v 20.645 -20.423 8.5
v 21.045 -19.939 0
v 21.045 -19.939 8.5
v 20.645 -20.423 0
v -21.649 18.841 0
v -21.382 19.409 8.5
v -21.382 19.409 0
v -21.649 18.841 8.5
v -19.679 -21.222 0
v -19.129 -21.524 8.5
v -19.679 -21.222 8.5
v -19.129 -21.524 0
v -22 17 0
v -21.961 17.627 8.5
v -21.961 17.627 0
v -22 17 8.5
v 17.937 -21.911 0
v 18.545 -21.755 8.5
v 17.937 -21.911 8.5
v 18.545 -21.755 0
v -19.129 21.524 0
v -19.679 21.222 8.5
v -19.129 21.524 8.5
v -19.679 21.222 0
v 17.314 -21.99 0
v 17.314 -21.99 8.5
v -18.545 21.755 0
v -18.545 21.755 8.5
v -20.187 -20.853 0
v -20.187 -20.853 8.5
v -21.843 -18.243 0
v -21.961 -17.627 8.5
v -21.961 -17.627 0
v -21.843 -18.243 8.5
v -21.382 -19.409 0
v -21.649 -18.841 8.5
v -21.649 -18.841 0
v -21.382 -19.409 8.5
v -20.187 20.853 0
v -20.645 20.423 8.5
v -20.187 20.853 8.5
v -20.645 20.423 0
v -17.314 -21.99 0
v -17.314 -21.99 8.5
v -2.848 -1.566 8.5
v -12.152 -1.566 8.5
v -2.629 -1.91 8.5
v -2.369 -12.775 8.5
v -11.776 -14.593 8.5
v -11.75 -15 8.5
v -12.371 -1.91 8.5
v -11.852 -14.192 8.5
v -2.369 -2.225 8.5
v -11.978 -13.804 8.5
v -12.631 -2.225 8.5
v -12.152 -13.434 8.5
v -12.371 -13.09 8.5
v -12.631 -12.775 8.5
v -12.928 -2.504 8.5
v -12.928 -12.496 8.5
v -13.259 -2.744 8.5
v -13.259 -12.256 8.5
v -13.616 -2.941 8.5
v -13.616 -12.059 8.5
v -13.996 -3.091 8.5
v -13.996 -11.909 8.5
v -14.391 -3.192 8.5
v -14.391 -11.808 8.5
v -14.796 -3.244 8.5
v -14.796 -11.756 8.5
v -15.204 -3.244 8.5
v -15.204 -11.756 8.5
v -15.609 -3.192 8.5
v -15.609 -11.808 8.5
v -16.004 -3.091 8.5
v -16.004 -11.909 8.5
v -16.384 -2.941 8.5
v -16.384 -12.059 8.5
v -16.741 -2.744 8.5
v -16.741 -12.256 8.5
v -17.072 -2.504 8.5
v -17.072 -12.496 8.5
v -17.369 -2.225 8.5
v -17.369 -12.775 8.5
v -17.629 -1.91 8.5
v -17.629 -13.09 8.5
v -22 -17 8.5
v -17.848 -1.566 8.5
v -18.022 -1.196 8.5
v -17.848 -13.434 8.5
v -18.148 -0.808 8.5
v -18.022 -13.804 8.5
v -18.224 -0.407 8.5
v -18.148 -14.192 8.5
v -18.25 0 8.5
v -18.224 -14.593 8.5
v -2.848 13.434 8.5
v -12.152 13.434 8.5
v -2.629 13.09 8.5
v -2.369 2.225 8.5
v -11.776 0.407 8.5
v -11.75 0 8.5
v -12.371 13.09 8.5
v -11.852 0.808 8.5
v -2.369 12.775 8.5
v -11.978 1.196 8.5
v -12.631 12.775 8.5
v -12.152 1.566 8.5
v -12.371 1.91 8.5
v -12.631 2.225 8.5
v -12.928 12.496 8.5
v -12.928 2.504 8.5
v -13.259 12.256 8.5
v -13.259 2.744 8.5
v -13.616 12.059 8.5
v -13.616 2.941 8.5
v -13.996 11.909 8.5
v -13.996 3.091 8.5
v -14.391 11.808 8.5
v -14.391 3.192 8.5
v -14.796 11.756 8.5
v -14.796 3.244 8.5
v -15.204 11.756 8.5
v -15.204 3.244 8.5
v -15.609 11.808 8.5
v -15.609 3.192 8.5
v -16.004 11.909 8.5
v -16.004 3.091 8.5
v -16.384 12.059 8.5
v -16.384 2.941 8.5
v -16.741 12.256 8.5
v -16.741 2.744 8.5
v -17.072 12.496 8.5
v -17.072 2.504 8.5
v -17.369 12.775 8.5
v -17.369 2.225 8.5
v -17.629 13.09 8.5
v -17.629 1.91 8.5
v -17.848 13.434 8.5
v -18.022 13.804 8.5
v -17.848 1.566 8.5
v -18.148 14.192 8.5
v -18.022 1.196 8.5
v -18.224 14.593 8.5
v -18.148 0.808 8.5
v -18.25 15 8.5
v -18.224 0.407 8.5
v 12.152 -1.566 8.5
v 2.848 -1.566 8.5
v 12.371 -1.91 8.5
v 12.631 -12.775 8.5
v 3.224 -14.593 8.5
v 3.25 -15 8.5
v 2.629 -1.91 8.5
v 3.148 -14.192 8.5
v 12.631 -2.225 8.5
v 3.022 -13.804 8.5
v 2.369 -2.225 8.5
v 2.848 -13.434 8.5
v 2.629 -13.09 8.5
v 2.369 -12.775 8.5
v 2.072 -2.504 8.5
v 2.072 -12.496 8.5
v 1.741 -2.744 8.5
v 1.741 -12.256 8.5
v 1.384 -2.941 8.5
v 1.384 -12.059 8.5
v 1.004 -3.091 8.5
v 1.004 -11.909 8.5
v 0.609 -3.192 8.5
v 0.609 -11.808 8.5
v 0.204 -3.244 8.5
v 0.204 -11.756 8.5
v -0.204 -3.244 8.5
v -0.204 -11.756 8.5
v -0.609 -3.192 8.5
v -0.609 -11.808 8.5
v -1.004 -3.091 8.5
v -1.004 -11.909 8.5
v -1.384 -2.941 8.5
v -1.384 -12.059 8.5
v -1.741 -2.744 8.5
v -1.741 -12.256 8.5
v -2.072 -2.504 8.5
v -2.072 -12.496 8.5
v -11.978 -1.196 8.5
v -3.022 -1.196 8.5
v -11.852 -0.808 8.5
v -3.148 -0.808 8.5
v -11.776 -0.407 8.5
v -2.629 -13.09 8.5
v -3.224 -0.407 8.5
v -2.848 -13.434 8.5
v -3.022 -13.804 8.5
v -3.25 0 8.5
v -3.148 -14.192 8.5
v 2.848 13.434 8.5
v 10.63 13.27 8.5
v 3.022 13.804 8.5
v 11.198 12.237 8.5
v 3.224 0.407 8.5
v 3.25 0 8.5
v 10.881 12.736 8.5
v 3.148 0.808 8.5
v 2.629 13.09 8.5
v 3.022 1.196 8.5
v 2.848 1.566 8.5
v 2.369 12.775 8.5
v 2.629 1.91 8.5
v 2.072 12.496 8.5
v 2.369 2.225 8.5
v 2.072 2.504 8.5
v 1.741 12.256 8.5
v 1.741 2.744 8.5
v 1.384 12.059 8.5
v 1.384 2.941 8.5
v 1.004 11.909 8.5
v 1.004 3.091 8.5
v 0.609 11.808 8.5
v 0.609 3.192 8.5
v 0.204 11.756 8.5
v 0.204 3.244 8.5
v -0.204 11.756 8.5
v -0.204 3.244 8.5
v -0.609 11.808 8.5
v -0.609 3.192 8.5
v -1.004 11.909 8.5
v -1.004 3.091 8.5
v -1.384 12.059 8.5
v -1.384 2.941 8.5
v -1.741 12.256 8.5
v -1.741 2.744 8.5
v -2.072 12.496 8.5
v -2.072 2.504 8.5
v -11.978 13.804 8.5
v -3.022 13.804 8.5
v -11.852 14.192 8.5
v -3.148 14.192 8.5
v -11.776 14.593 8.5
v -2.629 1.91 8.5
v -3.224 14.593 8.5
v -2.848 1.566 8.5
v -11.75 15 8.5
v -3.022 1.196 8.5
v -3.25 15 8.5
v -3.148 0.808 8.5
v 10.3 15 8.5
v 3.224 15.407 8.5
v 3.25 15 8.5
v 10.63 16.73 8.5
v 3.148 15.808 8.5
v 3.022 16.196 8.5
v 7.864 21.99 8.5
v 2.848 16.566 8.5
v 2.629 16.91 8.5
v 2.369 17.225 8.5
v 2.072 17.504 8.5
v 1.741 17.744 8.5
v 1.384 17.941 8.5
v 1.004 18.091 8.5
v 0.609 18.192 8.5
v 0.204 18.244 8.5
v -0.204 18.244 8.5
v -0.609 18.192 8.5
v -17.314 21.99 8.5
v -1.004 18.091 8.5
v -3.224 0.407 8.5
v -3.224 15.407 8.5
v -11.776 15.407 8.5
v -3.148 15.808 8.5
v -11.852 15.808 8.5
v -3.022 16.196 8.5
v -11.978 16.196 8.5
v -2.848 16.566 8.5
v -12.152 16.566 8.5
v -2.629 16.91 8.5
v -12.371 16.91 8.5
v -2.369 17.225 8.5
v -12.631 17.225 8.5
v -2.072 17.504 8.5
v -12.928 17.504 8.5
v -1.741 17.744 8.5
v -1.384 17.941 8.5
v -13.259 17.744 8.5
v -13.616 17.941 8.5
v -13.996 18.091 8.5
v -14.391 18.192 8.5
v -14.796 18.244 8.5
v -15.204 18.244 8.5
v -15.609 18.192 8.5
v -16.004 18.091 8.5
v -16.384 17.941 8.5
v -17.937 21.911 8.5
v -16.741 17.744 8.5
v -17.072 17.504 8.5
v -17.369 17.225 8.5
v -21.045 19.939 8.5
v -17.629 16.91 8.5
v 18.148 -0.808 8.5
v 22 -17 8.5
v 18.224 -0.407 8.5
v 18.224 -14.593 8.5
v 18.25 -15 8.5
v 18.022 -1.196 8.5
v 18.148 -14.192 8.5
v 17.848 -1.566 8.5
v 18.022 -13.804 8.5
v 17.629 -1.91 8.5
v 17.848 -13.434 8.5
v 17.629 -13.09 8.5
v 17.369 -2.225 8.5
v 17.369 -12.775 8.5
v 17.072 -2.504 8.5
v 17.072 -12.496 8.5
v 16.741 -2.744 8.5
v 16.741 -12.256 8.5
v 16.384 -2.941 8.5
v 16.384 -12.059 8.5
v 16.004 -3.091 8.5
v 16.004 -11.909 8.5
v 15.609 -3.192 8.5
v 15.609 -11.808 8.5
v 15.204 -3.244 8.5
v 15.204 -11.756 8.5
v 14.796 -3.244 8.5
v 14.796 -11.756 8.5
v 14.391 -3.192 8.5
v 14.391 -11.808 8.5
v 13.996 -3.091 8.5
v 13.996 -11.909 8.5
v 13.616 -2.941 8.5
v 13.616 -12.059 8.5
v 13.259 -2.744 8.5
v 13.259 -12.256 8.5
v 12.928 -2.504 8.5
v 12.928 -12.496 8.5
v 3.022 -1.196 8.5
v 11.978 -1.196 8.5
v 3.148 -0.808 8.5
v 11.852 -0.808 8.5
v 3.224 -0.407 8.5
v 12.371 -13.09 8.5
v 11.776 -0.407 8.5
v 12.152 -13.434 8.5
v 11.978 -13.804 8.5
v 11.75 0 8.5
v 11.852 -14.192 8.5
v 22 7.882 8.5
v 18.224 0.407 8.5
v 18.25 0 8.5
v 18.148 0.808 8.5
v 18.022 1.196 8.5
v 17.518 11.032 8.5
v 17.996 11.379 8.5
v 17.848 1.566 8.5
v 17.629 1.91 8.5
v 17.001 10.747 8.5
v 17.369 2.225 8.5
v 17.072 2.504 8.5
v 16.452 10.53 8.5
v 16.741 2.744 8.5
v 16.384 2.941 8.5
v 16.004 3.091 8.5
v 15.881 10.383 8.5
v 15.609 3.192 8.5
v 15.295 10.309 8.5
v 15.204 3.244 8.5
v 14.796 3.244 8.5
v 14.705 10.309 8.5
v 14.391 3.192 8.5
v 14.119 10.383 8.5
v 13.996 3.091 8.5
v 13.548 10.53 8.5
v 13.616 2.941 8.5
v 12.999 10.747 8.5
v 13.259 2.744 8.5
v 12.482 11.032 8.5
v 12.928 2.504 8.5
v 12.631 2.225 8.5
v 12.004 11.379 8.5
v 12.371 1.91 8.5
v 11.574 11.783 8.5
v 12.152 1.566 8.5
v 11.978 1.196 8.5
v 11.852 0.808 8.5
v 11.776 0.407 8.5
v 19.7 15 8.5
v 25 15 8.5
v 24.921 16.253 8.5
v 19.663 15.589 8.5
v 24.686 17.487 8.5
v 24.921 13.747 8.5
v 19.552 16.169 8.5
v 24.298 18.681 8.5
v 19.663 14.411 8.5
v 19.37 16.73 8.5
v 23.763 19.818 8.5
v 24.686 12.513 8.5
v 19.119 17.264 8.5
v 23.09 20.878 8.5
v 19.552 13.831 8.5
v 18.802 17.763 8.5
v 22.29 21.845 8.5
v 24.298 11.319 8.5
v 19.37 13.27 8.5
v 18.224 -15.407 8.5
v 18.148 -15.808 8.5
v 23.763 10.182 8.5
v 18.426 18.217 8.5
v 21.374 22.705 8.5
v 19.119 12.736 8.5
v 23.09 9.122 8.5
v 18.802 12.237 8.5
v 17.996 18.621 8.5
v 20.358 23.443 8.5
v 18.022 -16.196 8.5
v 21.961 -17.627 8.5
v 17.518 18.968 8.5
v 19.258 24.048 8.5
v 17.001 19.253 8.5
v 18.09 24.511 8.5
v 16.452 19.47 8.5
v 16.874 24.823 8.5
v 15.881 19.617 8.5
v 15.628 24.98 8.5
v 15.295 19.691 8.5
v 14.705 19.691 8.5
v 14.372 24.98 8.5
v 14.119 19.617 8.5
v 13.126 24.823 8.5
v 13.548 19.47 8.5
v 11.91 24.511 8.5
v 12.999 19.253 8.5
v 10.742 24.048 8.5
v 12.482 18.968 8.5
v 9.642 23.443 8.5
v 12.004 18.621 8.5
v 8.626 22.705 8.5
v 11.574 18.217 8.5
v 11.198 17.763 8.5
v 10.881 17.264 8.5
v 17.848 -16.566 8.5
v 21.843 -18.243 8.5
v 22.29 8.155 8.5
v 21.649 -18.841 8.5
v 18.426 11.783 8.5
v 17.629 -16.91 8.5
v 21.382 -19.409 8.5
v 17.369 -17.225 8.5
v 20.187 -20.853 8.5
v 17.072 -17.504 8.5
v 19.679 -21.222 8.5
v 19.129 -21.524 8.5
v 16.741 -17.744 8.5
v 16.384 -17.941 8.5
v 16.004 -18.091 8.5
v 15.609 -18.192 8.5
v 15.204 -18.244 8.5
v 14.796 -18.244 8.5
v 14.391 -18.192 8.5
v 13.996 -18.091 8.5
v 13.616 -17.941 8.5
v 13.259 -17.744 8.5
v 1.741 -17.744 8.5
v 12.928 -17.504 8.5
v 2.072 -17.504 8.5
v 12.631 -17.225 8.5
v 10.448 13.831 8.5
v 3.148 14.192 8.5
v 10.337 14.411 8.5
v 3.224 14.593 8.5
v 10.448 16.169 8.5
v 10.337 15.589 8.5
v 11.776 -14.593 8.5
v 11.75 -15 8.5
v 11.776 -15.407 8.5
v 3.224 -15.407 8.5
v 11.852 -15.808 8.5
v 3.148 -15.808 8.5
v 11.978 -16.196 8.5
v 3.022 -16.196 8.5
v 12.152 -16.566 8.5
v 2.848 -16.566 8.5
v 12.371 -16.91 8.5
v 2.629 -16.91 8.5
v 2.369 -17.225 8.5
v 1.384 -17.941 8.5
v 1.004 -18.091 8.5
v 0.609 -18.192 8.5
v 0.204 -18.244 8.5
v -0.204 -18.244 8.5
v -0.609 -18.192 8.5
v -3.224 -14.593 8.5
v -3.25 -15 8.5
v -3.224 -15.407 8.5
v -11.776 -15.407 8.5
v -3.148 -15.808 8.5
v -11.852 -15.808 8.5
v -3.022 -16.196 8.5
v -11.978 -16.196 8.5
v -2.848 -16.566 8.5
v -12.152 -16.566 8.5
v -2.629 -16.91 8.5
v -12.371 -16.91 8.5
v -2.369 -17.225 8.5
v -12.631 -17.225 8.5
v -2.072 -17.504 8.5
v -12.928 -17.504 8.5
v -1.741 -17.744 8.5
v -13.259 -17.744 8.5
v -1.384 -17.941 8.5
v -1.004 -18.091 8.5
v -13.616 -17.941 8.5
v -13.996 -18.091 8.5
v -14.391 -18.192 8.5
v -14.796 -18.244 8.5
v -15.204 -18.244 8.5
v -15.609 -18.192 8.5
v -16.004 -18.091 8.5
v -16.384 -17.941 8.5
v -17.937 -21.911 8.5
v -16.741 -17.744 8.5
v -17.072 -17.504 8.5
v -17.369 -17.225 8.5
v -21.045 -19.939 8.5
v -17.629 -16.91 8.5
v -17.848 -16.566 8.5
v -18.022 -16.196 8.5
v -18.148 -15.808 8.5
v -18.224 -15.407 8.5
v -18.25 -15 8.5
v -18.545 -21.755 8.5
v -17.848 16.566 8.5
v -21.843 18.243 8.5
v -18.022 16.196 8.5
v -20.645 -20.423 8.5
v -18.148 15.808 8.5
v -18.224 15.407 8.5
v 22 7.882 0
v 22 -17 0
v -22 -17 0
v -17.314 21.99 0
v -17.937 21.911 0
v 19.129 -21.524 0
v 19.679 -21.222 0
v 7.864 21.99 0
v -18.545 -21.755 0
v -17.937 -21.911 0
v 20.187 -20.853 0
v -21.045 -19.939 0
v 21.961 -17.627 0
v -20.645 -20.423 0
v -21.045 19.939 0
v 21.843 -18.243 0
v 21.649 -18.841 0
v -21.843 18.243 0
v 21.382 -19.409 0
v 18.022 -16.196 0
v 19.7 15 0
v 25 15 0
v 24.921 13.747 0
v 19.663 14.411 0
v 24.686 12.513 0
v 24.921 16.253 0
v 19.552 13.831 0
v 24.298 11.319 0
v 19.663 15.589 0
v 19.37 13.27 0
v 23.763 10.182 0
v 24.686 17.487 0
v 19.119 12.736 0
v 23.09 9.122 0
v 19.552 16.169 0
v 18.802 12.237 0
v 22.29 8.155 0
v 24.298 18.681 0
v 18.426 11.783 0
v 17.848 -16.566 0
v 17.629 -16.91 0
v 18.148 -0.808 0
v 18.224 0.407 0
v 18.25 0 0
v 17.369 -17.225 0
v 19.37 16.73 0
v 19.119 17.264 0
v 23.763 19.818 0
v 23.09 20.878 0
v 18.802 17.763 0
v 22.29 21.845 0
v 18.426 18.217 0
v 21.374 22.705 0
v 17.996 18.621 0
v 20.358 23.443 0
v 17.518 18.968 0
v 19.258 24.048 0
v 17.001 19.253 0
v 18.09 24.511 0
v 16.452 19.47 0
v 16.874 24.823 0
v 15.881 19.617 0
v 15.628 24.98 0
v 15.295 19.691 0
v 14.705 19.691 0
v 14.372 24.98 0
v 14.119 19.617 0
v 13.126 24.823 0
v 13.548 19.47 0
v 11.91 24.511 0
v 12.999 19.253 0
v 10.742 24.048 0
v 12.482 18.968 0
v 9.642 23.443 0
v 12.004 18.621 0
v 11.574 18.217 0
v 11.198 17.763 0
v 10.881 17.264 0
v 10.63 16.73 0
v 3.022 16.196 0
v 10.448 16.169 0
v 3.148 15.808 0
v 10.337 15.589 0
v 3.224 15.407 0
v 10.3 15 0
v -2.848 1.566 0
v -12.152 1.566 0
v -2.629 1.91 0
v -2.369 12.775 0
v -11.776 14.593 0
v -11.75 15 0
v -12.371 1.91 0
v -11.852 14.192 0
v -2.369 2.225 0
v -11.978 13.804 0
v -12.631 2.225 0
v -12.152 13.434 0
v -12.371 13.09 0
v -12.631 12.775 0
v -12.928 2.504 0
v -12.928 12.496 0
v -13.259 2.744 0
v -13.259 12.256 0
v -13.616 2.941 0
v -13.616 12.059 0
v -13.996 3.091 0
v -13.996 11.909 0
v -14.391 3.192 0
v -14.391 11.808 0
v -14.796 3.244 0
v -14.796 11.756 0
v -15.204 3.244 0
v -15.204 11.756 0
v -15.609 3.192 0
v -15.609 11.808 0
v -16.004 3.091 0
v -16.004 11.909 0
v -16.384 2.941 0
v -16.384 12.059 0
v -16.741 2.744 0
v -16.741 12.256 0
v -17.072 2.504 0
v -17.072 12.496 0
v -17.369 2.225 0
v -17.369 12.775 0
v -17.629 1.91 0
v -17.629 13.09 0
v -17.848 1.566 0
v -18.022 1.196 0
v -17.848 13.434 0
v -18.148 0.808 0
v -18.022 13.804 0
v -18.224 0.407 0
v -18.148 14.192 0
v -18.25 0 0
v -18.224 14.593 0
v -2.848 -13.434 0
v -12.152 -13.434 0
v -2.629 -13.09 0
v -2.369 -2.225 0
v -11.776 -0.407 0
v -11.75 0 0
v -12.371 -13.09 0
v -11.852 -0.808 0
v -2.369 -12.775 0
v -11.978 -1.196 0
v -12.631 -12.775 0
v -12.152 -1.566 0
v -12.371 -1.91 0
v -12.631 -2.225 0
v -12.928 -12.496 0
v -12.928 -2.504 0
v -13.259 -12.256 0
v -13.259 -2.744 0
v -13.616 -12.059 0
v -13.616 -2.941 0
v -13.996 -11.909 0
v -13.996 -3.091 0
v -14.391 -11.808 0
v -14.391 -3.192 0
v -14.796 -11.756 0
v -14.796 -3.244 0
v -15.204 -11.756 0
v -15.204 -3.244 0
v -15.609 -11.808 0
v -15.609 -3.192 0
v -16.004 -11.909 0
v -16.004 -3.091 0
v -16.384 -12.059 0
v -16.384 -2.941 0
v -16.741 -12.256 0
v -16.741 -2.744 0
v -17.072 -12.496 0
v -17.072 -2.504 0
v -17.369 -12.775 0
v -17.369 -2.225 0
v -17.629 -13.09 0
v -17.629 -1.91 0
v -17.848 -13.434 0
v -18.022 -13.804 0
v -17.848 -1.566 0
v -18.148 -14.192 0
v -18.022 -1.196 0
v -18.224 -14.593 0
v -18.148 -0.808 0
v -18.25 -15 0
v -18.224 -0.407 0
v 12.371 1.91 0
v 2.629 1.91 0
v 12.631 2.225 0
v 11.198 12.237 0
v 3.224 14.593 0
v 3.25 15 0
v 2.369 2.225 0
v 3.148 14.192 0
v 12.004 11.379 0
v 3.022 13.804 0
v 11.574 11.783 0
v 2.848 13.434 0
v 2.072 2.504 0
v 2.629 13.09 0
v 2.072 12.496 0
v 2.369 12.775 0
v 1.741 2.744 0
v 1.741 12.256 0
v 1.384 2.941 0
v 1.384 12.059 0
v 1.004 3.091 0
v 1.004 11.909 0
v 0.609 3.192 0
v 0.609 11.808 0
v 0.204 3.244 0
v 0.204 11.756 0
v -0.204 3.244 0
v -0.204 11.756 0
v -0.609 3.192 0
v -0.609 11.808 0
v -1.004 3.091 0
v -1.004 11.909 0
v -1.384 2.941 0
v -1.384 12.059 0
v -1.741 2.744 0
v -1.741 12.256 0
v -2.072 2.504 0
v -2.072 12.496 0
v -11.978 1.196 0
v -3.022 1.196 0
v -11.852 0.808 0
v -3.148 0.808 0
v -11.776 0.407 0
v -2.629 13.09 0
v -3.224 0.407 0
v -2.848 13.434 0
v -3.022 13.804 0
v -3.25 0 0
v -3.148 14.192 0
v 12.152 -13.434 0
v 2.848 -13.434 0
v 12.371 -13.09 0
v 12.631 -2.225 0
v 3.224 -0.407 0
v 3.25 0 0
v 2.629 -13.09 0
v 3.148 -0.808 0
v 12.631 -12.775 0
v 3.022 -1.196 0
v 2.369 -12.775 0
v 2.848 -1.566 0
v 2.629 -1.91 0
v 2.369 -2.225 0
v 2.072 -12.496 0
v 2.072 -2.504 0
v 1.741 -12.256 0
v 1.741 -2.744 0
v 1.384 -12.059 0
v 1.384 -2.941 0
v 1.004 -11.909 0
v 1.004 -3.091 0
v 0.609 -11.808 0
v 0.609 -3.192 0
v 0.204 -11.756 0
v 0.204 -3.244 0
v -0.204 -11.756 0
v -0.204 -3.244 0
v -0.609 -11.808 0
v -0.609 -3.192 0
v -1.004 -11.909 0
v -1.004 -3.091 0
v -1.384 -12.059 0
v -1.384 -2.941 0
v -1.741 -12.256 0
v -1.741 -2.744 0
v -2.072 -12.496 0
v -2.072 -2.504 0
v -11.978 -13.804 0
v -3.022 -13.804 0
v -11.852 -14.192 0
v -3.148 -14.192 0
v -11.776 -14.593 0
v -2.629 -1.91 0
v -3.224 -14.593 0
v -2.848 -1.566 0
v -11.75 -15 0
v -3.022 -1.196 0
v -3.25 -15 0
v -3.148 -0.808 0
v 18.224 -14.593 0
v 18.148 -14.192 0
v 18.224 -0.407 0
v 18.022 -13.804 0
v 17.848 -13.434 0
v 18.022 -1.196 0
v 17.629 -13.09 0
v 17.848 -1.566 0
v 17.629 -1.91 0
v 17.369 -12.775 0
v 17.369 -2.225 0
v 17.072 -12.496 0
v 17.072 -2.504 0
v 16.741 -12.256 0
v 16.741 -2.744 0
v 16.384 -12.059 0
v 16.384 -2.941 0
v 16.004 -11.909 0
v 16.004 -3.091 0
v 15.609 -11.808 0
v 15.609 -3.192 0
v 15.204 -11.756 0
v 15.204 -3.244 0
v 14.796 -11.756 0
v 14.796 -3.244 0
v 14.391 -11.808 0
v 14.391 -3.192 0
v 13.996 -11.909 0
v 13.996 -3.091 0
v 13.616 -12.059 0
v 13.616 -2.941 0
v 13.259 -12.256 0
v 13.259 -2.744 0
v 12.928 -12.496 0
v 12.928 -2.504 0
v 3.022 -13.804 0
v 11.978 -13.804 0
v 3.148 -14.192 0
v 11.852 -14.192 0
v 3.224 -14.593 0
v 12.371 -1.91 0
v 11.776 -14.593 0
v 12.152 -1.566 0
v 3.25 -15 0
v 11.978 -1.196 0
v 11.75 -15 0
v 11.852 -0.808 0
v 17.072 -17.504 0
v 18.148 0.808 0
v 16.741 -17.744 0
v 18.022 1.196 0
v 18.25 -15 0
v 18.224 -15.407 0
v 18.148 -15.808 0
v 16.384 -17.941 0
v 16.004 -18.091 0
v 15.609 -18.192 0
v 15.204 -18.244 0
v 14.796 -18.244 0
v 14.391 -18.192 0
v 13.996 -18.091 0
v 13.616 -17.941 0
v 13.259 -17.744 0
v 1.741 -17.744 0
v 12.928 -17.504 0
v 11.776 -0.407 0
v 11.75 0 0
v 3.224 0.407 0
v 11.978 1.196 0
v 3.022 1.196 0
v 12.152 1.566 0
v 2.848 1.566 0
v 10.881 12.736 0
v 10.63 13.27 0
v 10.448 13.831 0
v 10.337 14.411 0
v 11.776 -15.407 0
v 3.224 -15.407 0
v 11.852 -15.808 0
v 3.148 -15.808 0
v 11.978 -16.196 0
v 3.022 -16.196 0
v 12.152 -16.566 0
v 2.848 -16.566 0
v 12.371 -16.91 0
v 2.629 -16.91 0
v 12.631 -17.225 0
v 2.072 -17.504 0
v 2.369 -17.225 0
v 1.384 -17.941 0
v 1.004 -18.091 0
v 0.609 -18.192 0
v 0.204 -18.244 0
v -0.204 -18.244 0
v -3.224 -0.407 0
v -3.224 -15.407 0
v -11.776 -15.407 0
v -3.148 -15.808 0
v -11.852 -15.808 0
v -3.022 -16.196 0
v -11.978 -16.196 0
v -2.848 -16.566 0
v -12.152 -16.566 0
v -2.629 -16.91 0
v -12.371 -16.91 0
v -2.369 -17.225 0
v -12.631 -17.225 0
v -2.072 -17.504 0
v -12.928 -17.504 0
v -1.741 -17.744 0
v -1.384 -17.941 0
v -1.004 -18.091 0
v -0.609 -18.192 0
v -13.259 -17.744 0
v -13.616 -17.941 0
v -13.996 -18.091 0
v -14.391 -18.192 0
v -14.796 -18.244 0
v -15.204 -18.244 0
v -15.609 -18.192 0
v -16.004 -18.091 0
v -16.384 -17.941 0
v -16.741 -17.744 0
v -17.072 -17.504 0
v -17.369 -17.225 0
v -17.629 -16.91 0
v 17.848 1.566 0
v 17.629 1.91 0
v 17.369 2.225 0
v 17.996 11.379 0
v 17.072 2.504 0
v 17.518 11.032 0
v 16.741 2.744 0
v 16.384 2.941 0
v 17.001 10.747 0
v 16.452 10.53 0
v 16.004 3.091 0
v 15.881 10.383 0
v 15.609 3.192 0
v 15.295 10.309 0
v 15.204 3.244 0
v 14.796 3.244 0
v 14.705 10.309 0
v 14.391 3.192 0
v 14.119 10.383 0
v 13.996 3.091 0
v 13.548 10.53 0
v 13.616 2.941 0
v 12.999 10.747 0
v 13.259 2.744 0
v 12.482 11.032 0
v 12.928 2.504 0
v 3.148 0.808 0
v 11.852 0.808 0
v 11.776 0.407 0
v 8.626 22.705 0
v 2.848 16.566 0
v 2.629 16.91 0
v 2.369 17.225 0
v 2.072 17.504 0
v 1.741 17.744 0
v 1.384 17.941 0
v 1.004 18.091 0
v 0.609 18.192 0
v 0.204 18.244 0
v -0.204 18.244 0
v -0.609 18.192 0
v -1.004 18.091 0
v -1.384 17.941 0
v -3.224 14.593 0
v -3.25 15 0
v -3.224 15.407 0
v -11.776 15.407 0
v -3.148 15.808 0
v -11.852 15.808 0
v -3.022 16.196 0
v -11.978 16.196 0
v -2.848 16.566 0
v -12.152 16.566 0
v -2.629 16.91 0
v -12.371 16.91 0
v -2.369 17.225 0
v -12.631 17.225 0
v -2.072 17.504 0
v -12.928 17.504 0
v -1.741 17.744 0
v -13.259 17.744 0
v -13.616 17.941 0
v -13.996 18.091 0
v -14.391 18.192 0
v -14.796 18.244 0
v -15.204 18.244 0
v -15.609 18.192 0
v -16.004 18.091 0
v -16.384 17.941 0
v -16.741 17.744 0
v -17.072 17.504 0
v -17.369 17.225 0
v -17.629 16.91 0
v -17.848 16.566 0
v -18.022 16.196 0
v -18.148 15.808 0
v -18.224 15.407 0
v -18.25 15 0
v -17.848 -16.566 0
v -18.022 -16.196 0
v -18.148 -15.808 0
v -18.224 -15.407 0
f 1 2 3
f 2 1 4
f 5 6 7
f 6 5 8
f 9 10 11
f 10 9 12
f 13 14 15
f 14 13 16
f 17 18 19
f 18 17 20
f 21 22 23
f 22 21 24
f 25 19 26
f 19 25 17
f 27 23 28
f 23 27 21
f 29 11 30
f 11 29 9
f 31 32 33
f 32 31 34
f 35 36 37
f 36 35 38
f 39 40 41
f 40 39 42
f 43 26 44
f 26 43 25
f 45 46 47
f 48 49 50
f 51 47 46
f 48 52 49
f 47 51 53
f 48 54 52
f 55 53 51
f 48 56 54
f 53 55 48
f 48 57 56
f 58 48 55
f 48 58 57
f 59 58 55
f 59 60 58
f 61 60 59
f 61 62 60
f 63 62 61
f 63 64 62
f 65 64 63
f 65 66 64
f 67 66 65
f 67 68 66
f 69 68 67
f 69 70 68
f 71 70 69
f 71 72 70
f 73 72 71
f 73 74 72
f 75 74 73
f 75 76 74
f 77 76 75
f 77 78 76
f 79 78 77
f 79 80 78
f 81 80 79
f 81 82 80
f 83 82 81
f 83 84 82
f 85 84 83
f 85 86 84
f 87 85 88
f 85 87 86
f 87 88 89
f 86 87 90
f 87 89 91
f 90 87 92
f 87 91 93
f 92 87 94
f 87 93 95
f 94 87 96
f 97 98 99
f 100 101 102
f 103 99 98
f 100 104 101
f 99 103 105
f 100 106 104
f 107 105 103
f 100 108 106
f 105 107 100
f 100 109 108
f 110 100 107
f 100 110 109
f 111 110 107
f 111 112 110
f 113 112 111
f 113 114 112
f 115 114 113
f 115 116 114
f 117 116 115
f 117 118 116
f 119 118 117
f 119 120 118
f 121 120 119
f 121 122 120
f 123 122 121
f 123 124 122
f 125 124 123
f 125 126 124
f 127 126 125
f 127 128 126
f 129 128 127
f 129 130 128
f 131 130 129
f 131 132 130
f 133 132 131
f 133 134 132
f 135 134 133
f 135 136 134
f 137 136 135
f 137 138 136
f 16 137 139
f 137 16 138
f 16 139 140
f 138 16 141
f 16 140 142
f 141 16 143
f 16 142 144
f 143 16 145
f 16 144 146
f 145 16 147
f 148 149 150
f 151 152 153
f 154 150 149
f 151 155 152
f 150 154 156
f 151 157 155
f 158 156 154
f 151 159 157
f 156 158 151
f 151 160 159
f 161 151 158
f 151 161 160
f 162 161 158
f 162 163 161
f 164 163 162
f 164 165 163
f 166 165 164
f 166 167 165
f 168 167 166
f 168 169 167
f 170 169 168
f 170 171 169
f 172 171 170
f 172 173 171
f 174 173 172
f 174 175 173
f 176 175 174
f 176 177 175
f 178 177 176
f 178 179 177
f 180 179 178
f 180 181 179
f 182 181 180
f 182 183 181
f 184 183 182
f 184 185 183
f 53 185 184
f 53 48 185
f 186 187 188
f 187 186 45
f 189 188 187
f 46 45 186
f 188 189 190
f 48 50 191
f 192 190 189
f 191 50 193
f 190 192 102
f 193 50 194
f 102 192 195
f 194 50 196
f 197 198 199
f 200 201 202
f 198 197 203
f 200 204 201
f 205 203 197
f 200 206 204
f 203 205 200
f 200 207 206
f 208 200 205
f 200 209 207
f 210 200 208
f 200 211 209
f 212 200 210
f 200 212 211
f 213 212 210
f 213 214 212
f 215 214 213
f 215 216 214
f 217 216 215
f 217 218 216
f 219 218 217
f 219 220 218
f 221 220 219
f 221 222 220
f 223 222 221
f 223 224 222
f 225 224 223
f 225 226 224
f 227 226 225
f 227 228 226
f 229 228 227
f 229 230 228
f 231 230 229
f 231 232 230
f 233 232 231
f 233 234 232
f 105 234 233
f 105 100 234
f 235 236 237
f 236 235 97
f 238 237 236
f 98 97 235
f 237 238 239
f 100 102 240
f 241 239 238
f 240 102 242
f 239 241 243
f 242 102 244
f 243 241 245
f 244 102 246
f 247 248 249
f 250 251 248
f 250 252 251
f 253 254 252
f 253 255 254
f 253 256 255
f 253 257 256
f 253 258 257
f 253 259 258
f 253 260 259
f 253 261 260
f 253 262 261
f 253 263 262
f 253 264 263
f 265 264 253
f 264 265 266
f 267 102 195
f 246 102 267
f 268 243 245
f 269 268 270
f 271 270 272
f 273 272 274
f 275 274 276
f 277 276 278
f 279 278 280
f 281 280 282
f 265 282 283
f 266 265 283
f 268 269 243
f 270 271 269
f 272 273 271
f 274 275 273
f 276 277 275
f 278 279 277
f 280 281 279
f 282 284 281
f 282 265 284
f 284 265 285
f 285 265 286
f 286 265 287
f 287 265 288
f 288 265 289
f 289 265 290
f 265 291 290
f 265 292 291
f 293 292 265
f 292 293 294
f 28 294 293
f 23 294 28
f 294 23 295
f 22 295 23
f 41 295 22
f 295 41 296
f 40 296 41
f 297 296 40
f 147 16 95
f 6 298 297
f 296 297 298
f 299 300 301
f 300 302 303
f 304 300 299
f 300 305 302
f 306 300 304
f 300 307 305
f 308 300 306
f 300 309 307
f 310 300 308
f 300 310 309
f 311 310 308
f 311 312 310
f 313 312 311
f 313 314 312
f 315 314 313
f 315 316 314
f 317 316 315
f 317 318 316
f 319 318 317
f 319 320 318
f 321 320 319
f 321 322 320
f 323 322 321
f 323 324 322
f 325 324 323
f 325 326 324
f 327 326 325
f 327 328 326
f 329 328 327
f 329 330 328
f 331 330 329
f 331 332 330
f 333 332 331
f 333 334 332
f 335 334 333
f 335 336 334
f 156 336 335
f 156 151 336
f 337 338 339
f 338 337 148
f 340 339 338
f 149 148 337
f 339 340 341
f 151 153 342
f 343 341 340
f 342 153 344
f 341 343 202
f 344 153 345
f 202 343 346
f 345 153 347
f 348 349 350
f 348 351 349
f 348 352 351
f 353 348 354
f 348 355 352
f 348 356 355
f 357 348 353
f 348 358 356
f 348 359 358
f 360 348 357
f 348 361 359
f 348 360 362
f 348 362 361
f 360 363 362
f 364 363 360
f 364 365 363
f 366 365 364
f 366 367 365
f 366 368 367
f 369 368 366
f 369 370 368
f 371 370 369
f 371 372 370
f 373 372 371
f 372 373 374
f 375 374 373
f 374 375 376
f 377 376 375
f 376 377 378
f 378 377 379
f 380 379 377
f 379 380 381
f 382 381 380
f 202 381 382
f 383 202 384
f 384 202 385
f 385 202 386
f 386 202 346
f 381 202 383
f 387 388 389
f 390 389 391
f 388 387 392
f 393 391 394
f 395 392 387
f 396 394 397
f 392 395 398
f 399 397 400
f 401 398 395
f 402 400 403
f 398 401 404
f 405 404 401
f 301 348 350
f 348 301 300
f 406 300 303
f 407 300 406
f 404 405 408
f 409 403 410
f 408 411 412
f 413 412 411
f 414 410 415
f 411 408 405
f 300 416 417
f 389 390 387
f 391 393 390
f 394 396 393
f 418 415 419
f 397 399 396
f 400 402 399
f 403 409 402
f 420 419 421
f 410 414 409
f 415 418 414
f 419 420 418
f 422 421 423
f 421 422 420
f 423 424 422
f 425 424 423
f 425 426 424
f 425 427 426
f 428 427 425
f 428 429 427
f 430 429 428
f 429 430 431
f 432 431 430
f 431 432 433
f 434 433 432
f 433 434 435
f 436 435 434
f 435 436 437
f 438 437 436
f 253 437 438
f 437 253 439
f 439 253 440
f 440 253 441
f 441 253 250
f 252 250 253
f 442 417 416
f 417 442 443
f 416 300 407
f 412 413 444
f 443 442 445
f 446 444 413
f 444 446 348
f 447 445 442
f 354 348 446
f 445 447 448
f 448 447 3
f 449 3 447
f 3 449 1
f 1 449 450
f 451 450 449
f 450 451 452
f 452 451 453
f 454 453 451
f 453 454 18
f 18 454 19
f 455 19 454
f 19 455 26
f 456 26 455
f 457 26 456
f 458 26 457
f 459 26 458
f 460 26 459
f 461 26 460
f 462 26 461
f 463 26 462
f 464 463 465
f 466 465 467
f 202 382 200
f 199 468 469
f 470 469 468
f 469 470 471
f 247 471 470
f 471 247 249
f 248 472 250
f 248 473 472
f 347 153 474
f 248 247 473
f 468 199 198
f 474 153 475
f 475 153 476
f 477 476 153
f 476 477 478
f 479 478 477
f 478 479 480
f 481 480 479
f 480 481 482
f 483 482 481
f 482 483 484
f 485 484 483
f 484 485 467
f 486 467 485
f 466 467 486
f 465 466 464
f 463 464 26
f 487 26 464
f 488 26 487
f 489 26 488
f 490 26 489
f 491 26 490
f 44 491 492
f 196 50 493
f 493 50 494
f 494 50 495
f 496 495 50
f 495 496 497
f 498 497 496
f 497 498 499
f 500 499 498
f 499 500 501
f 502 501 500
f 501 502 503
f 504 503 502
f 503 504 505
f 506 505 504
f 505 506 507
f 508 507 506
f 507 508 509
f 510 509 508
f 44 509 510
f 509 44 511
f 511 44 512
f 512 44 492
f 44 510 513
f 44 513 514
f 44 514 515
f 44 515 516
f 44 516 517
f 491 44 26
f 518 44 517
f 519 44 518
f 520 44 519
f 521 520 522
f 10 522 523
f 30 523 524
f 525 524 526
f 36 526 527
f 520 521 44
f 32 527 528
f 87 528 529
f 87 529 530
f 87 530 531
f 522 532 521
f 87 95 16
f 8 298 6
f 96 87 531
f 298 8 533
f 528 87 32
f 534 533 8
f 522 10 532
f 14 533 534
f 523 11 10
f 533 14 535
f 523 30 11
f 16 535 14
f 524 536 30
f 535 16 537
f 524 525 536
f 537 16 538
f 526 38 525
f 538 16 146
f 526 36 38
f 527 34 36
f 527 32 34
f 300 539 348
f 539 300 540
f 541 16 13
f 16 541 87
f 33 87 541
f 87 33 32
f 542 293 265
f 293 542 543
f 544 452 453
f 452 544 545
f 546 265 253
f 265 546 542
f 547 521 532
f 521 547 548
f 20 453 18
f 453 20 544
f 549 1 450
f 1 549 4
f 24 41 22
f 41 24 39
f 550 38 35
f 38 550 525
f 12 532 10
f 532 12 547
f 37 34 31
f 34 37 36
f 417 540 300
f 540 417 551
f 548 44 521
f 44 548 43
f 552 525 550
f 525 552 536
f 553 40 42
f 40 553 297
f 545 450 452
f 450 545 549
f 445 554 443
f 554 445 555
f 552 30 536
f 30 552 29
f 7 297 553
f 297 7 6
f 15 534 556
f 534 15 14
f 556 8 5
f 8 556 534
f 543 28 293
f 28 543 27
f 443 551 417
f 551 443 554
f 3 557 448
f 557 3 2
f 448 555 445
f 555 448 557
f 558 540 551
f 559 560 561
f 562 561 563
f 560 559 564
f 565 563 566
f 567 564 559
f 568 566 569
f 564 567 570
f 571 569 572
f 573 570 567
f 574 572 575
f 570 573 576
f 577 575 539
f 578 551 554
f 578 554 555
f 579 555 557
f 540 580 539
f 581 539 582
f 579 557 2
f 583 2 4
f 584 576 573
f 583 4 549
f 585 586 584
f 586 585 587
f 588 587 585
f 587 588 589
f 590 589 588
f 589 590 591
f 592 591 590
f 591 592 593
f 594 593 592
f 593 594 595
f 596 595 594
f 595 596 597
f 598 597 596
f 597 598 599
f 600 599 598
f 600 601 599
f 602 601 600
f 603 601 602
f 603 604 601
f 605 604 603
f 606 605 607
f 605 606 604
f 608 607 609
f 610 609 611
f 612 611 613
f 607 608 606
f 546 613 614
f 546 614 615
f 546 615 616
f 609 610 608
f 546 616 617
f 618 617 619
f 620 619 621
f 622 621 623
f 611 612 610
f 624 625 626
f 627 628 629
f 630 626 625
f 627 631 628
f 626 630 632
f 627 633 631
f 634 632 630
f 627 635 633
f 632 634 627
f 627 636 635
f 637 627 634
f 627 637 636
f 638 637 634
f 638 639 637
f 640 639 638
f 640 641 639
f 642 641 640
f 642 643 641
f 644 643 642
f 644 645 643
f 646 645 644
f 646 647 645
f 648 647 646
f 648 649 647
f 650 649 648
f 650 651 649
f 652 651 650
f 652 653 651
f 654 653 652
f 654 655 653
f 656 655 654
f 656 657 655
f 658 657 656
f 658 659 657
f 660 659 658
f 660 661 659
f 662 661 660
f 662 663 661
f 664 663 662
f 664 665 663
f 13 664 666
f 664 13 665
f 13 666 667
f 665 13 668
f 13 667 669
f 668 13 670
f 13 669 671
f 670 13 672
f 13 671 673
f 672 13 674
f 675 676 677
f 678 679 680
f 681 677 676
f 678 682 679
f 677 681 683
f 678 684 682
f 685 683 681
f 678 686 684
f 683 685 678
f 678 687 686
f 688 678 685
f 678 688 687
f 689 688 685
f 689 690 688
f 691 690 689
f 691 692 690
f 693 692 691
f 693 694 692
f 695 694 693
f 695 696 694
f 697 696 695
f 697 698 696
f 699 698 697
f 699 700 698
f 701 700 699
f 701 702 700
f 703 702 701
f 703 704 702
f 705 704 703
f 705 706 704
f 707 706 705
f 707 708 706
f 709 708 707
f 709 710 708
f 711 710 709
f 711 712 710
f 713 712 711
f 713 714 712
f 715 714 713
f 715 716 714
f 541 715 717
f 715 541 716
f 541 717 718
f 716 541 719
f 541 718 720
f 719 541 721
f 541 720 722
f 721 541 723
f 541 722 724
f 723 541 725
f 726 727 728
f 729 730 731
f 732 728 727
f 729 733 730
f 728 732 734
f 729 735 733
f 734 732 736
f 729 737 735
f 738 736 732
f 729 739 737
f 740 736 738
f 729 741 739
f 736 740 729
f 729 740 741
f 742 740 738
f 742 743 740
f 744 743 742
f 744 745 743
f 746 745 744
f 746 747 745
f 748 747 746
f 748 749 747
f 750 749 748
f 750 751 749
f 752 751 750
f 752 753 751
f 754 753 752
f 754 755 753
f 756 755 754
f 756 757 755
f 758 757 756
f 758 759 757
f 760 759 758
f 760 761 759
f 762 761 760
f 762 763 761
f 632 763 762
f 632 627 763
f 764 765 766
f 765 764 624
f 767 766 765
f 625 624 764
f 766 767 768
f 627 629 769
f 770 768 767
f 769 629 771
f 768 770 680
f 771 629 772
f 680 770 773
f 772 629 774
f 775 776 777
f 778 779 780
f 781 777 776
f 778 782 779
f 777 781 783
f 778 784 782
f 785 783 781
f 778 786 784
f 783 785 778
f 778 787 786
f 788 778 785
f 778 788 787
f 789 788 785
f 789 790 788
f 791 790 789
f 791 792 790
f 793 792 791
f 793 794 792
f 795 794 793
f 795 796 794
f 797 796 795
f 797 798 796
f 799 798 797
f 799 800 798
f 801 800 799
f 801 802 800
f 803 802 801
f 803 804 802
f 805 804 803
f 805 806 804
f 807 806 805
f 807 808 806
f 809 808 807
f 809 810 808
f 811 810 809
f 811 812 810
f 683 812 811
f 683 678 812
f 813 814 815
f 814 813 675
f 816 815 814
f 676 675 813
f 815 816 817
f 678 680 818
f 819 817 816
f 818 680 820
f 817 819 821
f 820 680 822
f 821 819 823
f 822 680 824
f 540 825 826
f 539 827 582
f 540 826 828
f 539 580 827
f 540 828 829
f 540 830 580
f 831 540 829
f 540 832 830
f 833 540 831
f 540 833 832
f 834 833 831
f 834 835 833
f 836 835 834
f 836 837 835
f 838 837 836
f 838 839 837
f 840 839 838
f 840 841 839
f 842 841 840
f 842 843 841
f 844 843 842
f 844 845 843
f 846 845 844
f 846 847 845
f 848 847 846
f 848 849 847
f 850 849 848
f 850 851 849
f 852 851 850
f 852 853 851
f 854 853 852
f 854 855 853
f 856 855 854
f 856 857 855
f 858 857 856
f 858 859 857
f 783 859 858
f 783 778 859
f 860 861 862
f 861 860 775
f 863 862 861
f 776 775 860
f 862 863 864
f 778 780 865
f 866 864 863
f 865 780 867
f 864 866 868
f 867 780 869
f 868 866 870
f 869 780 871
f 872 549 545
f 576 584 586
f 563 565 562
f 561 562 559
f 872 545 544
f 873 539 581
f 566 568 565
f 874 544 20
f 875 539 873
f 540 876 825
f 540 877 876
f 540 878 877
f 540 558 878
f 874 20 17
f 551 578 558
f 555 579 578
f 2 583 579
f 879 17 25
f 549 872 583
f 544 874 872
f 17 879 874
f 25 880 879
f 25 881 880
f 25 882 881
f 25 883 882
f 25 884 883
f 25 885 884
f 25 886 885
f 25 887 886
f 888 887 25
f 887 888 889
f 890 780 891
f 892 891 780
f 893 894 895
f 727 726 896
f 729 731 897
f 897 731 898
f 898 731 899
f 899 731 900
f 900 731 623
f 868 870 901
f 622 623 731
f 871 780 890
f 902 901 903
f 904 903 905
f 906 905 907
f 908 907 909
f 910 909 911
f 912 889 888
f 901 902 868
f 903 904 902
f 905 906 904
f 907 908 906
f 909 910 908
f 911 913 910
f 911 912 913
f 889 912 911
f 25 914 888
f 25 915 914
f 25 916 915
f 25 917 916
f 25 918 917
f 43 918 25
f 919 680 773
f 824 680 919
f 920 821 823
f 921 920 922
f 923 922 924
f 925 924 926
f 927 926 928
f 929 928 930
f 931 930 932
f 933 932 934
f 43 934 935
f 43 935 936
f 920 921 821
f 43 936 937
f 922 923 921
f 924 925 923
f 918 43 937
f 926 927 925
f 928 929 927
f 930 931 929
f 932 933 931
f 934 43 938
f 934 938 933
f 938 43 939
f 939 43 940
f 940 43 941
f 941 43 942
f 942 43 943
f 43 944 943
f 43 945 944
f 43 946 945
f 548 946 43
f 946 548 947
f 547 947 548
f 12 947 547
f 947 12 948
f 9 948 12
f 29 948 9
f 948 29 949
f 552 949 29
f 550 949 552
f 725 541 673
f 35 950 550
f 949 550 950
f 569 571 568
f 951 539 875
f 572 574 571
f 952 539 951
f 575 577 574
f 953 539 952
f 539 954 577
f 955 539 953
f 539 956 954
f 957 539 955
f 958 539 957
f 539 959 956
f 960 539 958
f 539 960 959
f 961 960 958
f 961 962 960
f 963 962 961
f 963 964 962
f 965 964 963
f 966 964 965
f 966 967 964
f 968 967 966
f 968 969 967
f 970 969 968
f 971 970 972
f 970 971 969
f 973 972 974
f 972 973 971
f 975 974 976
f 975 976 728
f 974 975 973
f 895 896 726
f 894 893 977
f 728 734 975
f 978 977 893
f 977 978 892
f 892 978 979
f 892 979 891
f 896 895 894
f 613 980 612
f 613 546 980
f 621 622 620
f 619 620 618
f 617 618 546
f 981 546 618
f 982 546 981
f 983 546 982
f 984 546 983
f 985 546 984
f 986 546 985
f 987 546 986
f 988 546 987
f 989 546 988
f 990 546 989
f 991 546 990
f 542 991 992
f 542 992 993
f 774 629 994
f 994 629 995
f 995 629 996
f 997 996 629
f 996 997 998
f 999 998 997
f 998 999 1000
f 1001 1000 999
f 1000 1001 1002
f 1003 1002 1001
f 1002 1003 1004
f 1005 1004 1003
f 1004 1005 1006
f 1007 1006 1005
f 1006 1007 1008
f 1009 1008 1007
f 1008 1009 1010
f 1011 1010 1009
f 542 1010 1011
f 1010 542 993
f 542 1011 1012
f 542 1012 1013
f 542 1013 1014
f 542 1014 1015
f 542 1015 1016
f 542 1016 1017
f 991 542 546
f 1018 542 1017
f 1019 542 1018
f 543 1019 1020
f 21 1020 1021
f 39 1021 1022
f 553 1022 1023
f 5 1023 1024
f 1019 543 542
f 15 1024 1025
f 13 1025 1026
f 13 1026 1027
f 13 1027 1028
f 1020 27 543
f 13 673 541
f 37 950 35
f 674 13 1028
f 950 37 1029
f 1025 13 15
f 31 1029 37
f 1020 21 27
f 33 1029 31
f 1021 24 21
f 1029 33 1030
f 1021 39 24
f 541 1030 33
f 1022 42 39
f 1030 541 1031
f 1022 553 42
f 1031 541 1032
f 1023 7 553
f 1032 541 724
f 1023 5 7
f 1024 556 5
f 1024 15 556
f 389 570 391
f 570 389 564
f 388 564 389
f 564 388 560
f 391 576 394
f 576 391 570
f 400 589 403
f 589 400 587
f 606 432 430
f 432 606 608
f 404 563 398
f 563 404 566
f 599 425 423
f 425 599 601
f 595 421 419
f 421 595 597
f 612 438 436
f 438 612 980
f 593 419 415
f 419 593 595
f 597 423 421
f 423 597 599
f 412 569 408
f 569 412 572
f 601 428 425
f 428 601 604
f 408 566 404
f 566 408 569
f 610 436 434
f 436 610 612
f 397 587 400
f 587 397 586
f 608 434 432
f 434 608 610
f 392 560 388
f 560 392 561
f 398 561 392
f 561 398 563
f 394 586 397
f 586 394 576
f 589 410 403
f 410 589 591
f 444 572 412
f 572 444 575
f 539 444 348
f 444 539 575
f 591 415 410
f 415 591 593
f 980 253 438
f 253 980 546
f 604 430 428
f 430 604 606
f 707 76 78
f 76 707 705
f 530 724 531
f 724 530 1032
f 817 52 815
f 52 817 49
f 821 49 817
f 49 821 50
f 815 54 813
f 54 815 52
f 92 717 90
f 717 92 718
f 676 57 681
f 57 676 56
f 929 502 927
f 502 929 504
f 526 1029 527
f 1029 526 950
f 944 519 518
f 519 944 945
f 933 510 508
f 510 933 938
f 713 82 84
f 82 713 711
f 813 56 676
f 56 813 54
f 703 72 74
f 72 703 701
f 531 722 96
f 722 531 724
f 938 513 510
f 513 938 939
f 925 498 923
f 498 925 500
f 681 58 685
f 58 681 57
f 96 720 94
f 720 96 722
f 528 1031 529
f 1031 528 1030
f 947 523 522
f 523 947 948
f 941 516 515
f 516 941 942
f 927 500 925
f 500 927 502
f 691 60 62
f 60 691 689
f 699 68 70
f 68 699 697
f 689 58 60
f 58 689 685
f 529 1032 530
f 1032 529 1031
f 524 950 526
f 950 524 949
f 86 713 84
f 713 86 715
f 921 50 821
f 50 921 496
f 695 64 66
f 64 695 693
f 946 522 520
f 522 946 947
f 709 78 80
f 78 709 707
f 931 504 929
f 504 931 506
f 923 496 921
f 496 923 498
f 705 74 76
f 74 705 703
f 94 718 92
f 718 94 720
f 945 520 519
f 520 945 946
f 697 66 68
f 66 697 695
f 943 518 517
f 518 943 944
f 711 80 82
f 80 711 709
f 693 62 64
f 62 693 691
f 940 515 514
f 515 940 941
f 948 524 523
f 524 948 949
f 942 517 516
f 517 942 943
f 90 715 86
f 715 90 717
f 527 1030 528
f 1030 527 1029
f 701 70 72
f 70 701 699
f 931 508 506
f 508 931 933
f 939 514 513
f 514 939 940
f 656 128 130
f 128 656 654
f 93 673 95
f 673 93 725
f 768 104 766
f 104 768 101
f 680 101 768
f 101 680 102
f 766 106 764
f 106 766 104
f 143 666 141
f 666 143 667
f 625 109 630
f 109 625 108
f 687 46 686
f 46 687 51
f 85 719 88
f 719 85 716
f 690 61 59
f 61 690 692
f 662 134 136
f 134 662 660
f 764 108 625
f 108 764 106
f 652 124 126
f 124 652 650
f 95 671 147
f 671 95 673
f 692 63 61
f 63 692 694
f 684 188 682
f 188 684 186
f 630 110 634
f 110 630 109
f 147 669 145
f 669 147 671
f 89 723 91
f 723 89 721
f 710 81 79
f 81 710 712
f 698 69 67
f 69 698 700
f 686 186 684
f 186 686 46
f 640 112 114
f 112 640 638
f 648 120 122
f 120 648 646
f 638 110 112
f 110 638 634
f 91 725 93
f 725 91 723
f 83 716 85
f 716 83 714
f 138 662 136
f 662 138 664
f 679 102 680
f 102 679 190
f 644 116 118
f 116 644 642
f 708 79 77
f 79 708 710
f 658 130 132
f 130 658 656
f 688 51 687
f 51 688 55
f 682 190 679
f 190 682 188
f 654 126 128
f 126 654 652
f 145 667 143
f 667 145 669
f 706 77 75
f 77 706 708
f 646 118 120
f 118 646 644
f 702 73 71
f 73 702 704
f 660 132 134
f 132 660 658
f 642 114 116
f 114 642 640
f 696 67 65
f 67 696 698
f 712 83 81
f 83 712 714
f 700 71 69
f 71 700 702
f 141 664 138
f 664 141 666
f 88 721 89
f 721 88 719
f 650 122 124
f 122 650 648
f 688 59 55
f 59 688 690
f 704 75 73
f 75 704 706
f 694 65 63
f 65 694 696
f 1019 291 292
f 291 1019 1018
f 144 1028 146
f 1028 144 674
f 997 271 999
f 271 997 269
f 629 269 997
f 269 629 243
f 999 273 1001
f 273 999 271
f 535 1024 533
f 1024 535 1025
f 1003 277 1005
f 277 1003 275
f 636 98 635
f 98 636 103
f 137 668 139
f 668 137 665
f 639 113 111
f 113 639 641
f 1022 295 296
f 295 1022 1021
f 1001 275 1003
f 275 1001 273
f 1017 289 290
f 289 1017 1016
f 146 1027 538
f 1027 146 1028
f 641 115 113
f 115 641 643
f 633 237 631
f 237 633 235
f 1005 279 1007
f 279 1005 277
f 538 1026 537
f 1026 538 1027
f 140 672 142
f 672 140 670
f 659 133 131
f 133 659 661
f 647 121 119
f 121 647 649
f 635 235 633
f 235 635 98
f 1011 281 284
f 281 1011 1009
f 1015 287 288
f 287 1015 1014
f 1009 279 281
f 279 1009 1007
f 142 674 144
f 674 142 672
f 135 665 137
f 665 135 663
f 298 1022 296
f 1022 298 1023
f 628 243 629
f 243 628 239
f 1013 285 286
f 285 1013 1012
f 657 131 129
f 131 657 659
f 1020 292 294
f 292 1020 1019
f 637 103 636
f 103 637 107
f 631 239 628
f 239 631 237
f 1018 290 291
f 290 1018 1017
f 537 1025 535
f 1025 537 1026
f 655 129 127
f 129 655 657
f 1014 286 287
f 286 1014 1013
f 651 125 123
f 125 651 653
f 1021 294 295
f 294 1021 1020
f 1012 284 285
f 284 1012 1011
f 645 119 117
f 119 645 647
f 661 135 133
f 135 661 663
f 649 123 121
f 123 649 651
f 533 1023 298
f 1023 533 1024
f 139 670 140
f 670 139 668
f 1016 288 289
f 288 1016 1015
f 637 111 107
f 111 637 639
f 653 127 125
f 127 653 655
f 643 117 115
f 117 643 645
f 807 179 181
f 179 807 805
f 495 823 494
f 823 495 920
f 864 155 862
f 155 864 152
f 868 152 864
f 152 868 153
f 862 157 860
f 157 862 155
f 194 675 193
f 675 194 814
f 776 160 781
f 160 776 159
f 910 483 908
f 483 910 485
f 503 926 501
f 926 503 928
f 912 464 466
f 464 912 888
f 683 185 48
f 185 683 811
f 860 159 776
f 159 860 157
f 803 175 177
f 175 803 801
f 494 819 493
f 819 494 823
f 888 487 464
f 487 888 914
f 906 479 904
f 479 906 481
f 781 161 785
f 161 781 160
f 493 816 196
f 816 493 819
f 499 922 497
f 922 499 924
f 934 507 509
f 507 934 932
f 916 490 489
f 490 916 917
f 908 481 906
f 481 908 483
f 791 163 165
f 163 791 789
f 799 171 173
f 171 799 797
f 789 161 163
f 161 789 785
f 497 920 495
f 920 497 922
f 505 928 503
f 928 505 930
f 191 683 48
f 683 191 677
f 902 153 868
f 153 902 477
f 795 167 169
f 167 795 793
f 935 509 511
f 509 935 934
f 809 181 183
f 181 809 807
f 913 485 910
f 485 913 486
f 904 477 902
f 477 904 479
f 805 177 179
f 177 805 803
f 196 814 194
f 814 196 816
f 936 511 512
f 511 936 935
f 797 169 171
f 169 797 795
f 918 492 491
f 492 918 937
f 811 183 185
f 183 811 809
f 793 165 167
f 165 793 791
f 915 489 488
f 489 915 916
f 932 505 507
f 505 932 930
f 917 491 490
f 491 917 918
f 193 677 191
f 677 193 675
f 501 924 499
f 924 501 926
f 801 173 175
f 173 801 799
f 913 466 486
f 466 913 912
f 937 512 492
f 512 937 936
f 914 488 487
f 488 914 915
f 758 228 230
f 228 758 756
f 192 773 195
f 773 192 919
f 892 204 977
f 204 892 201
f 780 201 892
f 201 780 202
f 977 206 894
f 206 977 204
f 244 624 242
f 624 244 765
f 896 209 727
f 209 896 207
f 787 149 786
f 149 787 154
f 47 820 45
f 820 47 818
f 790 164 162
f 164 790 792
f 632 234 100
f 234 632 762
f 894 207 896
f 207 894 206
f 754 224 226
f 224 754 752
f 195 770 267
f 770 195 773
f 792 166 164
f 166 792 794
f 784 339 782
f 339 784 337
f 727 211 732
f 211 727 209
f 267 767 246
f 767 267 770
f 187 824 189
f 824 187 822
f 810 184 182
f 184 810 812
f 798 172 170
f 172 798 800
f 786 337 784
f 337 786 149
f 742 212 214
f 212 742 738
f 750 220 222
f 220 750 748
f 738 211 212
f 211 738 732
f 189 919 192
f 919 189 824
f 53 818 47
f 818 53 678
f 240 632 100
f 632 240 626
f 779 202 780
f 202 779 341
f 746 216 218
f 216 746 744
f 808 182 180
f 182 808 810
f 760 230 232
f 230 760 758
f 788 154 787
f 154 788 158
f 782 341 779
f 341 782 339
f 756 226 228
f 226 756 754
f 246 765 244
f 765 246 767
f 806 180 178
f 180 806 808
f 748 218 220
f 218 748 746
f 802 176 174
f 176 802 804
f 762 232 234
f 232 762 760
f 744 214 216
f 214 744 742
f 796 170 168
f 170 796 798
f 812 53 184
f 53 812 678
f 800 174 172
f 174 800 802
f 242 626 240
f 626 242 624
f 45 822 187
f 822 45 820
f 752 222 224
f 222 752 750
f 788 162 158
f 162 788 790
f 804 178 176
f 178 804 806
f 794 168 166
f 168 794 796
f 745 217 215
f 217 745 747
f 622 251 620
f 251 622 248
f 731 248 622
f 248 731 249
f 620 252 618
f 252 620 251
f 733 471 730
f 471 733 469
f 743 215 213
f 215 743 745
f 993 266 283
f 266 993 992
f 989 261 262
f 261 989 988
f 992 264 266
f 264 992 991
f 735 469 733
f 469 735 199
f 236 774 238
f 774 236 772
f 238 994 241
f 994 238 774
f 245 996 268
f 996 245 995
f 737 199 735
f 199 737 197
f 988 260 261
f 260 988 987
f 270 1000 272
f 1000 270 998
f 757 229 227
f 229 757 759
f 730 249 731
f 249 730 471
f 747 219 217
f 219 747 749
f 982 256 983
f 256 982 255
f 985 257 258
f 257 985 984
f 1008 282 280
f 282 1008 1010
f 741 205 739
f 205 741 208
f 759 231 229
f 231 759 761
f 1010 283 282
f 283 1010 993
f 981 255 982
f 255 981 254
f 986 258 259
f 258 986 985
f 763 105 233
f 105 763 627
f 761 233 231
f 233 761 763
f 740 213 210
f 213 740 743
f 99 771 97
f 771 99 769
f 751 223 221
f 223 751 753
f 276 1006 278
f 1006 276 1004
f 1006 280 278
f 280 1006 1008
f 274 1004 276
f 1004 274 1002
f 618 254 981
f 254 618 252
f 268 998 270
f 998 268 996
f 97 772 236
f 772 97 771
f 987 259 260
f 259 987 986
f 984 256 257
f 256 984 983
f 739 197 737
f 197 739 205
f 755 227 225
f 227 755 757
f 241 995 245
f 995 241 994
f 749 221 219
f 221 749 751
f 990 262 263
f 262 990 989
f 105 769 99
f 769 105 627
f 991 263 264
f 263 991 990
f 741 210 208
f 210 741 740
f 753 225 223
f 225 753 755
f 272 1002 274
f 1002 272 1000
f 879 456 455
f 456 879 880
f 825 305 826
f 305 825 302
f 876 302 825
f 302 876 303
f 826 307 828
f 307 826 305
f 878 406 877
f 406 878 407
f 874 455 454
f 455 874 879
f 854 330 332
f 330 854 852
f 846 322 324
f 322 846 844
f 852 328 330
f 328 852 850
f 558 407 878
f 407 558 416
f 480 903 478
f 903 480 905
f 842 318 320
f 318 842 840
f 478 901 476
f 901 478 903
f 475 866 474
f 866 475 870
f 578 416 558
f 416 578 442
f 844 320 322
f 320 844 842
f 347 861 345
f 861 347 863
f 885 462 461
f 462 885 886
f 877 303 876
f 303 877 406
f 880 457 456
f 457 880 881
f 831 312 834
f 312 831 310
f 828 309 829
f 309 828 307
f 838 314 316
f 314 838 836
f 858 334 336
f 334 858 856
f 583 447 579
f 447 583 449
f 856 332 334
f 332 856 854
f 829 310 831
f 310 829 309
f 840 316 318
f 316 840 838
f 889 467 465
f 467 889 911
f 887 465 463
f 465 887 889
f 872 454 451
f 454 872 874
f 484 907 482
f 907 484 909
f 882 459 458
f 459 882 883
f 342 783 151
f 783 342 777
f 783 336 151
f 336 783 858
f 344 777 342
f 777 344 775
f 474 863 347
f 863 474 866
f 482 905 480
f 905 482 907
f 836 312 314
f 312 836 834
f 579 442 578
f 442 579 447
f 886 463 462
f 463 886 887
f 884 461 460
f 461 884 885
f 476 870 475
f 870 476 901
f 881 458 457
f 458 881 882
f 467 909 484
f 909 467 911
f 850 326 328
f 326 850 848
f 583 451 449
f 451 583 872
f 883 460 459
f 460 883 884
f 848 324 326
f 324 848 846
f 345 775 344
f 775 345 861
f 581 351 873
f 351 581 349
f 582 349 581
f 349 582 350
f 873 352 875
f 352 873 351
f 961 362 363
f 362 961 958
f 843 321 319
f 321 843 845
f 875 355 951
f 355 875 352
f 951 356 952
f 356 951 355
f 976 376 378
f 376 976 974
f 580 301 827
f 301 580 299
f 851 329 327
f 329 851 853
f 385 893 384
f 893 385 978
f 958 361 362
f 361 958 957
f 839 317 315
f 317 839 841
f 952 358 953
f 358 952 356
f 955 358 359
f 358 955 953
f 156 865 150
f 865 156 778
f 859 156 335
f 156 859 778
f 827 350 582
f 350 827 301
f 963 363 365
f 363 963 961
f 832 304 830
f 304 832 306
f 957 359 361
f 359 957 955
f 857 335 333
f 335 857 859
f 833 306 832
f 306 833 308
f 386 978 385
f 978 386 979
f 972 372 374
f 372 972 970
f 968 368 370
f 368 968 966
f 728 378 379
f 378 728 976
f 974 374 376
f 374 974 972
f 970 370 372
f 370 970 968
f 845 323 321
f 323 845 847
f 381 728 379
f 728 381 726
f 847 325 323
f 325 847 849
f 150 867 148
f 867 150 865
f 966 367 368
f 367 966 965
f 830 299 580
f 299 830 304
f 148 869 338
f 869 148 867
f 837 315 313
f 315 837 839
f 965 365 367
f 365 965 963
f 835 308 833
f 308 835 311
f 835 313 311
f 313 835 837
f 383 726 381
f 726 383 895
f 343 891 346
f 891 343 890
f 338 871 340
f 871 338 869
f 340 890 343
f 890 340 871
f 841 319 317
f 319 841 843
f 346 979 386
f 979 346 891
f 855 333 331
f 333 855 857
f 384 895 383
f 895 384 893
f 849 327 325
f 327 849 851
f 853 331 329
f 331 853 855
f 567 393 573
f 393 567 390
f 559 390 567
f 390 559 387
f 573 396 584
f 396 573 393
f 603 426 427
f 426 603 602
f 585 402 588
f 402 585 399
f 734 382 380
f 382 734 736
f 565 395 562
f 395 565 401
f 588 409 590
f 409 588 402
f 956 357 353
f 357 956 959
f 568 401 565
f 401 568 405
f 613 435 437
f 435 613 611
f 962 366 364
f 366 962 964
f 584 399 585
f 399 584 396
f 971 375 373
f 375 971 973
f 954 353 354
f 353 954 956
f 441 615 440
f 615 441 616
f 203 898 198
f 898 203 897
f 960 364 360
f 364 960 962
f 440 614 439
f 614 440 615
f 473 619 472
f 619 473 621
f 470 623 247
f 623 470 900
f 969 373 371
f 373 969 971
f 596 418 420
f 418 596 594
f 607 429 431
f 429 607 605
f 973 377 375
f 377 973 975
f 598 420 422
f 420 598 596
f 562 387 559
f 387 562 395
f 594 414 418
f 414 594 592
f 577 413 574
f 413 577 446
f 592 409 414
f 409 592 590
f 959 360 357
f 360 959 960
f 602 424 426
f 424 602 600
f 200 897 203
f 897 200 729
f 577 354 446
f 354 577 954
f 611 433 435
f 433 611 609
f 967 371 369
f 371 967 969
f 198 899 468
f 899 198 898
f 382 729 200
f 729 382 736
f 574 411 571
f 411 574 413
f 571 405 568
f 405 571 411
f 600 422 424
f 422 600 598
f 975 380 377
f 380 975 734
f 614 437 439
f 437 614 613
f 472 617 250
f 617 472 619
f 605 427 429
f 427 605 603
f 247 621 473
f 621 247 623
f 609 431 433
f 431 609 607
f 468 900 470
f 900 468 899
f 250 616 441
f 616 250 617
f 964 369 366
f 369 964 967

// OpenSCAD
$fn = 50;


difference() {
	union() {
		*color(alpha = 1.0000000000, c = "gray") {
			translate(v = [0, 7, 0]) {
				linear_extrude(height = 1) {
					text(font = "Arial:style=Bold", halign = "center", size = 4.5000000000, text = "COMMENT plate main", valign = "center");
				}
			}
		}
		*color(alpha = 1.0000000000, c = "gray") {
			translate(v = [0, 14, 0]) {
				linear_extrude(height = 3) {
					text(font = "Arial:style=Bold", halign = "center", size = 4.5000000000, text = "COMMENT description oobb_plate_shape_p_type_8.5_depth_3_width_3_height_8.5_thickness_slip_corner_extra", valign = "center");
				}
			}
		}
		hull() {
			translate(v = [-17.0000000000, 17.0000000000, 0]) {
				cylinder(h = 8.5000000000, r = 5);
			}
			translate(v = [17.0000000000, 17.0000000000, 0]) {
				cylinder(h = 8.5000000000, r = 5);
			}
			translate(v = [-17.0000000000, -17.0000000000, 0]) {
				cylinder(h = 8.5000000000, r = 5);
			}
			translate(v = [17.0000000000, -17.0000000000, 0]) {
				cylinder(h = 8.5000000000, r = 5);
			}
		}
		translate(v = [15.0000000000, 15.0000000000, 0.0000000000]) {
			cylinder(h = 8.5000000000, r = 10.0000000000);
		}
	}
	union() {
		*color(alpha = 1.0000000000, c = "gray") {
			translate(v = [0, 7, 0]) {
				linear_extrude(height = 1) {
					text(font = "Arial:style=Bold", halign = "center", size = 4.5000000000, text = "COMMENT holes main", valign = "center");
				}
			}
		}
		*color(alpha = 1.0000000000, c = "gray") {
			translate(v = [0, 14, 0]) {
				linear_extrude(height = 3) {
					text(font = "Arial:style=Bold", halign = "center", size = 4.5000000000, text = "COMMENT description oobb_holes_shape_n_type_3_width_3_height_8.5_thickness_slip_corner_extra_false_both_holes", valign = "center");
				}
			}
		}
		translate(v = [-15.0000000000, -15.0000000000, 0]) {
			translate(v = [0, 0, -50]) {
				cylinder(h = 100, r = 3.2500000000);
			}
		}
		translate(v = [-15.0000000000, 0.0000000000, 0]) {
			translate(v = [0, 0, -50]) {
				cylinder(h = 100, r = 3.2500000000);
			}
		}
		translate(v = [-15.0000000000, 15.0000000000, 0]) {
			translate(v = [0, 0, -50]) {
				cylinder(h = 100, r = 3.2500000000);
			}
		}
		translate(v = [0.0000000000, -15.0000000000, 0]) {
			translate(v = [0, 0, -50]) {
				cylinder(h = 100, r = 3.2500000000);
			}
		}
		translate(v = [0, 0, -50]) {
			cylinder(h = 100, r = 3.2500000000);
		}
		translate(v = [0.0000000000, 15.0000000000, 0]) {
			translate(v = [0, 0, -50]) {
				cylinder(h = 100, r = 3.2500000000);
			}
		}
		translate(v = [15.0000000000, -15.0000000000, 0]) {
			translate(v = [0, 0, -50]) {
				cylinder(h = 100, r = 3.2500000000);
			}
		}
		translate(v = [15.0000000000, 0.0000000000, 0]) {
			translate(v = [0, 0, -50]) {
				cylinder(h = 100, r = 3.2500000000);
			}
		}
		translate(v = [15.0000000000, 15.0000000000, 0]) {
			translate(v = [0, 0, -50]) {
				cylinder(h = 100, r = 3.2500000000);
			}
		}
		*color(alpha = 1.0000000000, c = "gray") {
			translate(v = [0, 7, 0]) {
				linear_extrude(height = 1) {
					text(font = "Arial:style=Bold", halign = "center", size = 4.5000000000, text = "COMMENT slip_corner", valign = "center");
				}
			}
		}
		translate(v = [15.0000000000, 15.0000000000, -50.0000000000]) {
			cylinder(h = 100, r = 4.7000000000);
		}
	}
}
